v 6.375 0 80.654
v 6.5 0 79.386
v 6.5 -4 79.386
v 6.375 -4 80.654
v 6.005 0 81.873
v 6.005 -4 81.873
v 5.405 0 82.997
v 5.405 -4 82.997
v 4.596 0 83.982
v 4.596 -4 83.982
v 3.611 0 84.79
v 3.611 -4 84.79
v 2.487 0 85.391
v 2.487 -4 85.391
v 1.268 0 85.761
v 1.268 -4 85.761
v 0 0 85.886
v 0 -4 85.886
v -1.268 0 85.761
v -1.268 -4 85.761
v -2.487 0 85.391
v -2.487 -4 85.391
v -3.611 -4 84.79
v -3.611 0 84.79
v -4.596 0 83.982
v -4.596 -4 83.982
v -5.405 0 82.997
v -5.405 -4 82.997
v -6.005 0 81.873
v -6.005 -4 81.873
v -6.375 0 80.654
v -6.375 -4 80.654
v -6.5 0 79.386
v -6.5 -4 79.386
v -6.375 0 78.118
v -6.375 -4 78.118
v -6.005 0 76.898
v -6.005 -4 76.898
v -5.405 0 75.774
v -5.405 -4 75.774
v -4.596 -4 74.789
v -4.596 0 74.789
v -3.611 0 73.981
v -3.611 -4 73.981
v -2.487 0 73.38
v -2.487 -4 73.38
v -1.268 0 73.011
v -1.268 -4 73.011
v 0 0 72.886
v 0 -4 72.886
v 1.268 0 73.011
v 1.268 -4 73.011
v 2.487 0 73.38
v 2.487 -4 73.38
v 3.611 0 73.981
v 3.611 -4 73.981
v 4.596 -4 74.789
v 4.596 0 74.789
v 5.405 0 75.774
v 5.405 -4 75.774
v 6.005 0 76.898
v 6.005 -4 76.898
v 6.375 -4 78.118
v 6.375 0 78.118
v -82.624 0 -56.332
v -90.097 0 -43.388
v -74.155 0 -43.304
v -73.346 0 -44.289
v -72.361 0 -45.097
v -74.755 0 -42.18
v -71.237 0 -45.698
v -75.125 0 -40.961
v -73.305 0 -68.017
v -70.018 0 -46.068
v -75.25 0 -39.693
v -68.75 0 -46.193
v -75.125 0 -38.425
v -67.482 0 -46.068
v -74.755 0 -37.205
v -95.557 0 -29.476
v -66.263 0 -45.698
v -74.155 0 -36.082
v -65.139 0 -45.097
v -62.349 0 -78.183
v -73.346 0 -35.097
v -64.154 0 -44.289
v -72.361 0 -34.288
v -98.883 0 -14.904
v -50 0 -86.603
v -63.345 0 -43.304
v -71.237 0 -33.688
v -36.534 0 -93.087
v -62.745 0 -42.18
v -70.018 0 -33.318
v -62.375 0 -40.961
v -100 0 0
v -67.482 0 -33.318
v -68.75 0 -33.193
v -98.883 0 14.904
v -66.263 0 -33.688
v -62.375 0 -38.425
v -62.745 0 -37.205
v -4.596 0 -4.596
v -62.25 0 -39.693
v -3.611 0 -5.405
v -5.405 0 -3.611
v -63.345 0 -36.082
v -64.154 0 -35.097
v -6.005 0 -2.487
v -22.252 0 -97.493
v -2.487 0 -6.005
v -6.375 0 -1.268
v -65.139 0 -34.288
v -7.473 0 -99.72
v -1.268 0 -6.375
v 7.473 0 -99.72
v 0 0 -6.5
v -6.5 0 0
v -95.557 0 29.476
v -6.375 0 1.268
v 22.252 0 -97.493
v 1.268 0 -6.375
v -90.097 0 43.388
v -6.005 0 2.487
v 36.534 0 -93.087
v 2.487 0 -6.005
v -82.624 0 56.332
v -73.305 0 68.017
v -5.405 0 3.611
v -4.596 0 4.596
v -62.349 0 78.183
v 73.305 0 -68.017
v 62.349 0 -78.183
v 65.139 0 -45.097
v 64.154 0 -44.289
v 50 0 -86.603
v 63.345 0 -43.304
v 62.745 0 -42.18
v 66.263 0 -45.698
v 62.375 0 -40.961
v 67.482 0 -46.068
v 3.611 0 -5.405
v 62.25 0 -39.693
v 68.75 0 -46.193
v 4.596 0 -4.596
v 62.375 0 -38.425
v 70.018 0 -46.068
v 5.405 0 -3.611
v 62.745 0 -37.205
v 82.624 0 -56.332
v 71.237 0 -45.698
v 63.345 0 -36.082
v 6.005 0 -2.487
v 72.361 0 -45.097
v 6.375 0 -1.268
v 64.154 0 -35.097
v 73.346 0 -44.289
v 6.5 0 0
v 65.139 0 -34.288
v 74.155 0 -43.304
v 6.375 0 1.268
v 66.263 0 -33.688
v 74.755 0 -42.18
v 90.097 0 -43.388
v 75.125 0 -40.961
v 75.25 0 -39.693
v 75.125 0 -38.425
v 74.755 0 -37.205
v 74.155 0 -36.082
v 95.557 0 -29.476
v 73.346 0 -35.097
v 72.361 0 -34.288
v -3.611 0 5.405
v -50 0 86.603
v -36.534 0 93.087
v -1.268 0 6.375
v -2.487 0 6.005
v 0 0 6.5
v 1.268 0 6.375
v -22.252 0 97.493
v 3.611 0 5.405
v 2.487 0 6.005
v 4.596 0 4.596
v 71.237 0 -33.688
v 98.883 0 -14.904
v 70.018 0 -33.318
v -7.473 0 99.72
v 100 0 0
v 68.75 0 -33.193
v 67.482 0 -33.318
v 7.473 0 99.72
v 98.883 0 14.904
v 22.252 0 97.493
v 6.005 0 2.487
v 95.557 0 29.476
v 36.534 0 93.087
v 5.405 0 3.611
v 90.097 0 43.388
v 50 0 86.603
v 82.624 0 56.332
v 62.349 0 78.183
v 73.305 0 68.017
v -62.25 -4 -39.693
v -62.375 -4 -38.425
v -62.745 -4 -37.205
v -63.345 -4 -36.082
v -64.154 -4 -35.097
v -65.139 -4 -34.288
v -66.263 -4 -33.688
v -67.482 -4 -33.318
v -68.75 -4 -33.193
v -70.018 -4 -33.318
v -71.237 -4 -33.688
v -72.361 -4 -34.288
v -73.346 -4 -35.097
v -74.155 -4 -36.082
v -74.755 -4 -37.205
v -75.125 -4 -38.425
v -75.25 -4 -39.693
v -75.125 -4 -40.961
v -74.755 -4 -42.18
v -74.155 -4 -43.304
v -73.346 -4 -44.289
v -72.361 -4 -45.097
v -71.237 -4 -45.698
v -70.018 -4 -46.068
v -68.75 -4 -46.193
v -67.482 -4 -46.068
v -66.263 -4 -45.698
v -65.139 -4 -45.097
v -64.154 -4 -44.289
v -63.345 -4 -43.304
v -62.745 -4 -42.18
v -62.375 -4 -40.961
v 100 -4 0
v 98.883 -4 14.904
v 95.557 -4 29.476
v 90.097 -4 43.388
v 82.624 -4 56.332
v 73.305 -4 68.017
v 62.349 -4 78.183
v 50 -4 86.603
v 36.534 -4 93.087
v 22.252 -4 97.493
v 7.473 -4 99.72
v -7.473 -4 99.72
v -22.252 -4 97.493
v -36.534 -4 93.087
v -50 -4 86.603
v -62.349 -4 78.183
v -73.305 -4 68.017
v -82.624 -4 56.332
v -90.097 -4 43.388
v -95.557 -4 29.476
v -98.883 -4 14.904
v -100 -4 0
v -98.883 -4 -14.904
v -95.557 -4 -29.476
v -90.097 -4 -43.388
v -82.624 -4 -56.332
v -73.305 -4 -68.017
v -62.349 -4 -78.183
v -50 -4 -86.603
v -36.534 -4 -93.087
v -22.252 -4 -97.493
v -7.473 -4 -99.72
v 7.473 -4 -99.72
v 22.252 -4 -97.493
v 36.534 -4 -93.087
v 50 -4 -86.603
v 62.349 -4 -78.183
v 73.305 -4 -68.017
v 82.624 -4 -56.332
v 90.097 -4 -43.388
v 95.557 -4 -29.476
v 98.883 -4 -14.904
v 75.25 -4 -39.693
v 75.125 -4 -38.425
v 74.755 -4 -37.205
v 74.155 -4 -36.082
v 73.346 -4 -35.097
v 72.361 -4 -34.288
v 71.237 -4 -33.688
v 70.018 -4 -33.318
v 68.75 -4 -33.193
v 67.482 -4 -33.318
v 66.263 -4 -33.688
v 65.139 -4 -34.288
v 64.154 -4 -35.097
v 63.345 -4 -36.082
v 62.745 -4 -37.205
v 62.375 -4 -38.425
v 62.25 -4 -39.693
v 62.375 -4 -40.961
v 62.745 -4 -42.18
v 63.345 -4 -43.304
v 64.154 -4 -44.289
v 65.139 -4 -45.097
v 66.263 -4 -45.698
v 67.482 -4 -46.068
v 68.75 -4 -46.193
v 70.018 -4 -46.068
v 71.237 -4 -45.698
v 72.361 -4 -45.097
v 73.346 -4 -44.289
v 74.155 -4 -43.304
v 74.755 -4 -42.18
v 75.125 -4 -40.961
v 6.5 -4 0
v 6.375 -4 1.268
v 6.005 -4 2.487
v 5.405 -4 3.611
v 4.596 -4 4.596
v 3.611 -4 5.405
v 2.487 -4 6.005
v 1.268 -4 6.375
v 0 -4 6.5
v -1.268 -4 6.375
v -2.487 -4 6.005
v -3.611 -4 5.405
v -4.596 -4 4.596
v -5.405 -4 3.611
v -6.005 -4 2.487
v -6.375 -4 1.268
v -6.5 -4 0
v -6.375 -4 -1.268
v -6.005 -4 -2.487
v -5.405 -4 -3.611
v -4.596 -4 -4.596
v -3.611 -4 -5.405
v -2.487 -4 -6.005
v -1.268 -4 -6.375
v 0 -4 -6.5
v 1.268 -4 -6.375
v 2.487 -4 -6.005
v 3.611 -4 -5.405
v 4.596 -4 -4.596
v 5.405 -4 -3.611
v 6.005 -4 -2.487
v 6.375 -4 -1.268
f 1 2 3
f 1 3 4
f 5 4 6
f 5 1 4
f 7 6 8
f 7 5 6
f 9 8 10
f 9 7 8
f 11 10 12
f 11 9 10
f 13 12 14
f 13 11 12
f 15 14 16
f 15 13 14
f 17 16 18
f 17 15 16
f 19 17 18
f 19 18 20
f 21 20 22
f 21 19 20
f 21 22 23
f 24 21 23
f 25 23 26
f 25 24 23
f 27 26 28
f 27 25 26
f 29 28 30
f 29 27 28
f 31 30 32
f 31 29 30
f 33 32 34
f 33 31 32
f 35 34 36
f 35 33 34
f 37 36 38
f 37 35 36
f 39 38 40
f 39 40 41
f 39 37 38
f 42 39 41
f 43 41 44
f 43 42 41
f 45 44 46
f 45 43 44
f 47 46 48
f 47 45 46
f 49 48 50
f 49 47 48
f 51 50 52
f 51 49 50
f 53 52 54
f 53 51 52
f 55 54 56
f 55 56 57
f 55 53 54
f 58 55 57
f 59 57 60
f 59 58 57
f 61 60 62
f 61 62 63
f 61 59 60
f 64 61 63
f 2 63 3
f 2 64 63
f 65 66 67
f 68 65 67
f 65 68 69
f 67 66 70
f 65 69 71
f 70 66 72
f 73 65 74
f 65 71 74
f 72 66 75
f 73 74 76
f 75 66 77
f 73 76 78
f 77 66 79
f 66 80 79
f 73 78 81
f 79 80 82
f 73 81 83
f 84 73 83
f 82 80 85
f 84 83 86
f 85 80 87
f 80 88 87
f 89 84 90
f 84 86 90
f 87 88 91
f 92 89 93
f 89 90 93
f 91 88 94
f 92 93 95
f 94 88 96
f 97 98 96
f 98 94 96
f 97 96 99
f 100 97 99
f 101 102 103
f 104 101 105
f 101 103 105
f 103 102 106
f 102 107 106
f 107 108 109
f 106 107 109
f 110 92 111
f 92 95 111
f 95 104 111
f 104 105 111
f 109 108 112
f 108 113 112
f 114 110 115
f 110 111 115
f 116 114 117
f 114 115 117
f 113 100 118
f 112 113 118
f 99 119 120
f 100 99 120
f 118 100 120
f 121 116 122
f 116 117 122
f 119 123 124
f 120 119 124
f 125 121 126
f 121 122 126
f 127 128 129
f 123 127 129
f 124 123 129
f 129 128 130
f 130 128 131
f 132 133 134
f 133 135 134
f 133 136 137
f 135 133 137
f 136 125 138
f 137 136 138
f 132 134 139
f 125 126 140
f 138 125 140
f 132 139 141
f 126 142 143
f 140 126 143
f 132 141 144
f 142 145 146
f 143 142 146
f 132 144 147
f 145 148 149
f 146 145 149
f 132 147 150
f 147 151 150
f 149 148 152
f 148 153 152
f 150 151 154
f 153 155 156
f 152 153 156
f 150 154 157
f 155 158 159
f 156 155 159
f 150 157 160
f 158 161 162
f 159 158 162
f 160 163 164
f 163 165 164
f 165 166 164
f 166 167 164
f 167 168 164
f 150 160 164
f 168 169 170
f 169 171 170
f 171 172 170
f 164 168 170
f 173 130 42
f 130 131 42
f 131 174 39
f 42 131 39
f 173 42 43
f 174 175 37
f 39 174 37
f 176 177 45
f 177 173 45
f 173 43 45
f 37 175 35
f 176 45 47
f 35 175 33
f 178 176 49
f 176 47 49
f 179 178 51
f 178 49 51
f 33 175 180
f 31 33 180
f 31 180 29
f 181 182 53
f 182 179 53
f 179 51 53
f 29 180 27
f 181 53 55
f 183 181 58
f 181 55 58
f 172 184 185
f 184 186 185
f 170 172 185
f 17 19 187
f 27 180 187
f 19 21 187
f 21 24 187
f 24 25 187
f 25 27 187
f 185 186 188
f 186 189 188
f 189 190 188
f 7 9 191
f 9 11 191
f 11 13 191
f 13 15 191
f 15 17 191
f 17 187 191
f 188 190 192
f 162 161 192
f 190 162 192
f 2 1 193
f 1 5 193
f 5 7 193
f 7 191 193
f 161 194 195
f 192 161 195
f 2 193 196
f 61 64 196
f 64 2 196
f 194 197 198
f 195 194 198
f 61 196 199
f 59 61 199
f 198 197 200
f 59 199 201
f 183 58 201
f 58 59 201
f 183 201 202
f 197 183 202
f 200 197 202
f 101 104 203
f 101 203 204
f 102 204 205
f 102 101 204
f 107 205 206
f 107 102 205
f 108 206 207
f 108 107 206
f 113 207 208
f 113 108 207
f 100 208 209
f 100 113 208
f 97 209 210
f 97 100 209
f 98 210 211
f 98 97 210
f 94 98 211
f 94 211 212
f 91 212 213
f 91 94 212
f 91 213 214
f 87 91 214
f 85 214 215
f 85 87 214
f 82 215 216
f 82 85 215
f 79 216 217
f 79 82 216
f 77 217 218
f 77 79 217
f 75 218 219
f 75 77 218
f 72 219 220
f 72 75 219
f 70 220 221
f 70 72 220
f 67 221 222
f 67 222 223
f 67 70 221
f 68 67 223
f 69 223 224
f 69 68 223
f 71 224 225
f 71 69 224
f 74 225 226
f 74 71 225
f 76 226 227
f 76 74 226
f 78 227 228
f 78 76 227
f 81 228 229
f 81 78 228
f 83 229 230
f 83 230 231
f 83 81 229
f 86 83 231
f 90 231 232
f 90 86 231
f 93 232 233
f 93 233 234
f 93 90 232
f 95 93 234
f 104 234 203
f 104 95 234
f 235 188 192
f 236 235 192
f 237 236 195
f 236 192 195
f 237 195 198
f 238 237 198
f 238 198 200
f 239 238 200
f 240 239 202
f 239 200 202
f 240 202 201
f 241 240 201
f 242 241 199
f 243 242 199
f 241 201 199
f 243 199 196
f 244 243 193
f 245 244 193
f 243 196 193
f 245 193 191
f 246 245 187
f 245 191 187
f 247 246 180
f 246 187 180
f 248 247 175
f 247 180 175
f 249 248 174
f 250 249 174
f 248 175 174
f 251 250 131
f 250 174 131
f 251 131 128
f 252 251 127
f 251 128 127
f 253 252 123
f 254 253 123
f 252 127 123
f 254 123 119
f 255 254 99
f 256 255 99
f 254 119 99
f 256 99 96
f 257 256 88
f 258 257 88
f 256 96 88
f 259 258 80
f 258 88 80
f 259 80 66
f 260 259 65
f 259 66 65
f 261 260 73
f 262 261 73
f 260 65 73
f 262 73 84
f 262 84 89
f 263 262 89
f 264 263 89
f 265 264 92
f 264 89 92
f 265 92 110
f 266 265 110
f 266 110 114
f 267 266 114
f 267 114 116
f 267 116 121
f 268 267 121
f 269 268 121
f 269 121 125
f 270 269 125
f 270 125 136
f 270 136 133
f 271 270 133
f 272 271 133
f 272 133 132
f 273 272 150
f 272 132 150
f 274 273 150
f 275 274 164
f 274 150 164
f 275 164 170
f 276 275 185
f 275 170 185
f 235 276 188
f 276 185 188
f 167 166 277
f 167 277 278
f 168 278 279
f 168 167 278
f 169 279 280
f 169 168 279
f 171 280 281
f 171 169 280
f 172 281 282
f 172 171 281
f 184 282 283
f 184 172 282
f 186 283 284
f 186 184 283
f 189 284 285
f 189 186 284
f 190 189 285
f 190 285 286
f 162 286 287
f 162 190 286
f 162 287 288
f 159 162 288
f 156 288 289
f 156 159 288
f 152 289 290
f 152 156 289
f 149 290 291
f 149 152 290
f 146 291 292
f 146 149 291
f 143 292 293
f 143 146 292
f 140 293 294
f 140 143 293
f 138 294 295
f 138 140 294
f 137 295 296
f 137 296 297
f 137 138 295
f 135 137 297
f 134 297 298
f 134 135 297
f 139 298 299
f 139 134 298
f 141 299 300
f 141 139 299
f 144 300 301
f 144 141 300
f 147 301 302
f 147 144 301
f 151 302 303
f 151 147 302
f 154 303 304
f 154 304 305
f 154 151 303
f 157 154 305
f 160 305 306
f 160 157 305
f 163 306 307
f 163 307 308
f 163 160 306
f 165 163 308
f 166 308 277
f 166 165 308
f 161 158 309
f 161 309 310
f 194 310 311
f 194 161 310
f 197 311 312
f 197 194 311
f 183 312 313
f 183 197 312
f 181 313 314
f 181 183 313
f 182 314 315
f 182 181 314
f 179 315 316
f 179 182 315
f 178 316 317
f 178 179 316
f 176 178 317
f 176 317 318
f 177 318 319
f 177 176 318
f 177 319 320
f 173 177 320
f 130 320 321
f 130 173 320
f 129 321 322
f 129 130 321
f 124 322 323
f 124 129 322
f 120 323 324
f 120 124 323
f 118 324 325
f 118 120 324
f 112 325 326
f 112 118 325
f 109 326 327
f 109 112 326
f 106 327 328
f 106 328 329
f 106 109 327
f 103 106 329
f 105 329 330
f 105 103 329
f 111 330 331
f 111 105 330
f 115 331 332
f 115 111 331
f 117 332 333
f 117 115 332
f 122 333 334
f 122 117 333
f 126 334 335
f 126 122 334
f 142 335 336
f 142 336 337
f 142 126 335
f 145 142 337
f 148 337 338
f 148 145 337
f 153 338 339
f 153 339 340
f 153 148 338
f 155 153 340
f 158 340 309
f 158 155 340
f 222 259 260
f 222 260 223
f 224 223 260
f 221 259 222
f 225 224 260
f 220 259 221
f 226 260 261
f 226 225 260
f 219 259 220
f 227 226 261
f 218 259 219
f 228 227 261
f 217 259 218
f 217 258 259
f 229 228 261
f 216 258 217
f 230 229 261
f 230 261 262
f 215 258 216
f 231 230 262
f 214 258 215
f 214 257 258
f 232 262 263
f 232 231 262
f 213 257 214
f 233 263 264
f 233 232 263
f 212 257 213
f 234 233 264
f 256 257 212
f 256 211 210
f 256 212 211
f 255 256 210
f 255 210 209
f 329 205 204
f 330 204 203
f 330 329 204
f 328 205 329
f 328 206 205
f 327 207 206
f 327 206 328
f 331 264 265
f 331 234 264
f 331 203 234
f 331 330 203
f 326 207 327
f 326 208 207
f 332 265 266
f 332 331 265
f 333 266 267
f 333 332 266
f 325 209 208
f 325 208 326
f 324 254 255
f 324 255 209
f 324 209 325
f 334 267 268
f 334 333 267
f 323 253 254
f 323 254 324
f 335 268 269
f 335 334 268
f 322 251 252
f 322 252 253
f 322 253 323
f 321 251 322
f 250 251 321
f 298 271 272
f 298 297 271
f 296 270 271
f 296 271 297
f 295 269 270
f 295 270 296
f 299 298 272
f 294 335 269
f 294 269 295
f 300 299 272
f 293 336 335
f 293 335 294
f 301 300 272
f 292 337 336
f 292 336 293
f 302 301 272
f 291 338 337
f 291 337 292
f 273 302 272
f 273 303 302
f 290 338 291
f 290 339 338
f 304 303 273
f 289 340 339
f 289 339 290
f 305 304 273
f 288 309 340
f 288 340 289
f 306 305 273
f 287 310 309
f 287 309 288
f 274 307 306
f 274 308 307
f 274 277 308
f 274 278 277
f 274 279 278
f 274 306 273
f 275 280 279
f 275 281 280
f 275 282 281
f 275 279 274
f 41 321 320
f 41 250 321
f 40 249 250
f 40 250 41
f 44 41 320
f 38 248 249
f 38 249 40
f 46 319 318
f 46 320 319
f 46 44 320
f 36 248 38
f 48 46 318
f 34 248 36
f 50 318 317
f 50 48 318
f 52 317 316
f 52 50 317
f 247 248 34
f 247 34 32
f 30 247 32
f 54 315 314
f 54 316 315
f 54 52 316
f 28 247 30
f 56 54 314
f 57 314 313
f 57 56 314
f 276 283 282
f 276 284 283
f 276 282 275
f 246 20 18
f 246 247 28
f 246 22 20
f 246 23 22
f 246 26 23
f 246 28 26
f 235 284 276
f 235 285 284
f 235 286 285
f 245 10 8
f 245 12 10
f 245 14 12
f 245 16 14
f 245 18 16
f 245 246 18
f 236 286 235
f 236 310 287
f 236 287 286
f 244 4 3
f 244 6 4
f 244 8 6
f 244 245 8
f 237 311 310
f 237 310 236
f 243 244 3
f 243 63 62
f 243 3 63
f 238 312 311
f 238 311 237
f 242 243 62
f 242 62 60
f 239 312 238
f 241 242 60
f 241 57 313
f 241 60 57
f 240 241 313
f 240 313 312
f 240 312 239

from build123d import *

# Parameters (mm, degrees)
F0_R     = 100
F0_R_2   = 6.5
F1_DEPTH = 4


with BuildPart() as f1:
    # F0 (on Front) → F1 (new body)
    with BuildSketch(Plane.XZ):
        Circle(F0_R)
        with Locations((-68.75, -39.692831)):
            Circle(F0_R_2, mode=Mode.SUBTRACT)
        with Locations((68.75, -39.692831)):
            Circle(F0_R_2, mode=Mode.SUBTRACT)
        Circle(F0_R_2, mode=Mode.SUBTRACT)
        with Locations((0, 79.385662)):
            Circle(F0_R_2, mode=Mode.SUBTRACT)
    extrude(amount=F1_DEPTH)


solid = f1.part
